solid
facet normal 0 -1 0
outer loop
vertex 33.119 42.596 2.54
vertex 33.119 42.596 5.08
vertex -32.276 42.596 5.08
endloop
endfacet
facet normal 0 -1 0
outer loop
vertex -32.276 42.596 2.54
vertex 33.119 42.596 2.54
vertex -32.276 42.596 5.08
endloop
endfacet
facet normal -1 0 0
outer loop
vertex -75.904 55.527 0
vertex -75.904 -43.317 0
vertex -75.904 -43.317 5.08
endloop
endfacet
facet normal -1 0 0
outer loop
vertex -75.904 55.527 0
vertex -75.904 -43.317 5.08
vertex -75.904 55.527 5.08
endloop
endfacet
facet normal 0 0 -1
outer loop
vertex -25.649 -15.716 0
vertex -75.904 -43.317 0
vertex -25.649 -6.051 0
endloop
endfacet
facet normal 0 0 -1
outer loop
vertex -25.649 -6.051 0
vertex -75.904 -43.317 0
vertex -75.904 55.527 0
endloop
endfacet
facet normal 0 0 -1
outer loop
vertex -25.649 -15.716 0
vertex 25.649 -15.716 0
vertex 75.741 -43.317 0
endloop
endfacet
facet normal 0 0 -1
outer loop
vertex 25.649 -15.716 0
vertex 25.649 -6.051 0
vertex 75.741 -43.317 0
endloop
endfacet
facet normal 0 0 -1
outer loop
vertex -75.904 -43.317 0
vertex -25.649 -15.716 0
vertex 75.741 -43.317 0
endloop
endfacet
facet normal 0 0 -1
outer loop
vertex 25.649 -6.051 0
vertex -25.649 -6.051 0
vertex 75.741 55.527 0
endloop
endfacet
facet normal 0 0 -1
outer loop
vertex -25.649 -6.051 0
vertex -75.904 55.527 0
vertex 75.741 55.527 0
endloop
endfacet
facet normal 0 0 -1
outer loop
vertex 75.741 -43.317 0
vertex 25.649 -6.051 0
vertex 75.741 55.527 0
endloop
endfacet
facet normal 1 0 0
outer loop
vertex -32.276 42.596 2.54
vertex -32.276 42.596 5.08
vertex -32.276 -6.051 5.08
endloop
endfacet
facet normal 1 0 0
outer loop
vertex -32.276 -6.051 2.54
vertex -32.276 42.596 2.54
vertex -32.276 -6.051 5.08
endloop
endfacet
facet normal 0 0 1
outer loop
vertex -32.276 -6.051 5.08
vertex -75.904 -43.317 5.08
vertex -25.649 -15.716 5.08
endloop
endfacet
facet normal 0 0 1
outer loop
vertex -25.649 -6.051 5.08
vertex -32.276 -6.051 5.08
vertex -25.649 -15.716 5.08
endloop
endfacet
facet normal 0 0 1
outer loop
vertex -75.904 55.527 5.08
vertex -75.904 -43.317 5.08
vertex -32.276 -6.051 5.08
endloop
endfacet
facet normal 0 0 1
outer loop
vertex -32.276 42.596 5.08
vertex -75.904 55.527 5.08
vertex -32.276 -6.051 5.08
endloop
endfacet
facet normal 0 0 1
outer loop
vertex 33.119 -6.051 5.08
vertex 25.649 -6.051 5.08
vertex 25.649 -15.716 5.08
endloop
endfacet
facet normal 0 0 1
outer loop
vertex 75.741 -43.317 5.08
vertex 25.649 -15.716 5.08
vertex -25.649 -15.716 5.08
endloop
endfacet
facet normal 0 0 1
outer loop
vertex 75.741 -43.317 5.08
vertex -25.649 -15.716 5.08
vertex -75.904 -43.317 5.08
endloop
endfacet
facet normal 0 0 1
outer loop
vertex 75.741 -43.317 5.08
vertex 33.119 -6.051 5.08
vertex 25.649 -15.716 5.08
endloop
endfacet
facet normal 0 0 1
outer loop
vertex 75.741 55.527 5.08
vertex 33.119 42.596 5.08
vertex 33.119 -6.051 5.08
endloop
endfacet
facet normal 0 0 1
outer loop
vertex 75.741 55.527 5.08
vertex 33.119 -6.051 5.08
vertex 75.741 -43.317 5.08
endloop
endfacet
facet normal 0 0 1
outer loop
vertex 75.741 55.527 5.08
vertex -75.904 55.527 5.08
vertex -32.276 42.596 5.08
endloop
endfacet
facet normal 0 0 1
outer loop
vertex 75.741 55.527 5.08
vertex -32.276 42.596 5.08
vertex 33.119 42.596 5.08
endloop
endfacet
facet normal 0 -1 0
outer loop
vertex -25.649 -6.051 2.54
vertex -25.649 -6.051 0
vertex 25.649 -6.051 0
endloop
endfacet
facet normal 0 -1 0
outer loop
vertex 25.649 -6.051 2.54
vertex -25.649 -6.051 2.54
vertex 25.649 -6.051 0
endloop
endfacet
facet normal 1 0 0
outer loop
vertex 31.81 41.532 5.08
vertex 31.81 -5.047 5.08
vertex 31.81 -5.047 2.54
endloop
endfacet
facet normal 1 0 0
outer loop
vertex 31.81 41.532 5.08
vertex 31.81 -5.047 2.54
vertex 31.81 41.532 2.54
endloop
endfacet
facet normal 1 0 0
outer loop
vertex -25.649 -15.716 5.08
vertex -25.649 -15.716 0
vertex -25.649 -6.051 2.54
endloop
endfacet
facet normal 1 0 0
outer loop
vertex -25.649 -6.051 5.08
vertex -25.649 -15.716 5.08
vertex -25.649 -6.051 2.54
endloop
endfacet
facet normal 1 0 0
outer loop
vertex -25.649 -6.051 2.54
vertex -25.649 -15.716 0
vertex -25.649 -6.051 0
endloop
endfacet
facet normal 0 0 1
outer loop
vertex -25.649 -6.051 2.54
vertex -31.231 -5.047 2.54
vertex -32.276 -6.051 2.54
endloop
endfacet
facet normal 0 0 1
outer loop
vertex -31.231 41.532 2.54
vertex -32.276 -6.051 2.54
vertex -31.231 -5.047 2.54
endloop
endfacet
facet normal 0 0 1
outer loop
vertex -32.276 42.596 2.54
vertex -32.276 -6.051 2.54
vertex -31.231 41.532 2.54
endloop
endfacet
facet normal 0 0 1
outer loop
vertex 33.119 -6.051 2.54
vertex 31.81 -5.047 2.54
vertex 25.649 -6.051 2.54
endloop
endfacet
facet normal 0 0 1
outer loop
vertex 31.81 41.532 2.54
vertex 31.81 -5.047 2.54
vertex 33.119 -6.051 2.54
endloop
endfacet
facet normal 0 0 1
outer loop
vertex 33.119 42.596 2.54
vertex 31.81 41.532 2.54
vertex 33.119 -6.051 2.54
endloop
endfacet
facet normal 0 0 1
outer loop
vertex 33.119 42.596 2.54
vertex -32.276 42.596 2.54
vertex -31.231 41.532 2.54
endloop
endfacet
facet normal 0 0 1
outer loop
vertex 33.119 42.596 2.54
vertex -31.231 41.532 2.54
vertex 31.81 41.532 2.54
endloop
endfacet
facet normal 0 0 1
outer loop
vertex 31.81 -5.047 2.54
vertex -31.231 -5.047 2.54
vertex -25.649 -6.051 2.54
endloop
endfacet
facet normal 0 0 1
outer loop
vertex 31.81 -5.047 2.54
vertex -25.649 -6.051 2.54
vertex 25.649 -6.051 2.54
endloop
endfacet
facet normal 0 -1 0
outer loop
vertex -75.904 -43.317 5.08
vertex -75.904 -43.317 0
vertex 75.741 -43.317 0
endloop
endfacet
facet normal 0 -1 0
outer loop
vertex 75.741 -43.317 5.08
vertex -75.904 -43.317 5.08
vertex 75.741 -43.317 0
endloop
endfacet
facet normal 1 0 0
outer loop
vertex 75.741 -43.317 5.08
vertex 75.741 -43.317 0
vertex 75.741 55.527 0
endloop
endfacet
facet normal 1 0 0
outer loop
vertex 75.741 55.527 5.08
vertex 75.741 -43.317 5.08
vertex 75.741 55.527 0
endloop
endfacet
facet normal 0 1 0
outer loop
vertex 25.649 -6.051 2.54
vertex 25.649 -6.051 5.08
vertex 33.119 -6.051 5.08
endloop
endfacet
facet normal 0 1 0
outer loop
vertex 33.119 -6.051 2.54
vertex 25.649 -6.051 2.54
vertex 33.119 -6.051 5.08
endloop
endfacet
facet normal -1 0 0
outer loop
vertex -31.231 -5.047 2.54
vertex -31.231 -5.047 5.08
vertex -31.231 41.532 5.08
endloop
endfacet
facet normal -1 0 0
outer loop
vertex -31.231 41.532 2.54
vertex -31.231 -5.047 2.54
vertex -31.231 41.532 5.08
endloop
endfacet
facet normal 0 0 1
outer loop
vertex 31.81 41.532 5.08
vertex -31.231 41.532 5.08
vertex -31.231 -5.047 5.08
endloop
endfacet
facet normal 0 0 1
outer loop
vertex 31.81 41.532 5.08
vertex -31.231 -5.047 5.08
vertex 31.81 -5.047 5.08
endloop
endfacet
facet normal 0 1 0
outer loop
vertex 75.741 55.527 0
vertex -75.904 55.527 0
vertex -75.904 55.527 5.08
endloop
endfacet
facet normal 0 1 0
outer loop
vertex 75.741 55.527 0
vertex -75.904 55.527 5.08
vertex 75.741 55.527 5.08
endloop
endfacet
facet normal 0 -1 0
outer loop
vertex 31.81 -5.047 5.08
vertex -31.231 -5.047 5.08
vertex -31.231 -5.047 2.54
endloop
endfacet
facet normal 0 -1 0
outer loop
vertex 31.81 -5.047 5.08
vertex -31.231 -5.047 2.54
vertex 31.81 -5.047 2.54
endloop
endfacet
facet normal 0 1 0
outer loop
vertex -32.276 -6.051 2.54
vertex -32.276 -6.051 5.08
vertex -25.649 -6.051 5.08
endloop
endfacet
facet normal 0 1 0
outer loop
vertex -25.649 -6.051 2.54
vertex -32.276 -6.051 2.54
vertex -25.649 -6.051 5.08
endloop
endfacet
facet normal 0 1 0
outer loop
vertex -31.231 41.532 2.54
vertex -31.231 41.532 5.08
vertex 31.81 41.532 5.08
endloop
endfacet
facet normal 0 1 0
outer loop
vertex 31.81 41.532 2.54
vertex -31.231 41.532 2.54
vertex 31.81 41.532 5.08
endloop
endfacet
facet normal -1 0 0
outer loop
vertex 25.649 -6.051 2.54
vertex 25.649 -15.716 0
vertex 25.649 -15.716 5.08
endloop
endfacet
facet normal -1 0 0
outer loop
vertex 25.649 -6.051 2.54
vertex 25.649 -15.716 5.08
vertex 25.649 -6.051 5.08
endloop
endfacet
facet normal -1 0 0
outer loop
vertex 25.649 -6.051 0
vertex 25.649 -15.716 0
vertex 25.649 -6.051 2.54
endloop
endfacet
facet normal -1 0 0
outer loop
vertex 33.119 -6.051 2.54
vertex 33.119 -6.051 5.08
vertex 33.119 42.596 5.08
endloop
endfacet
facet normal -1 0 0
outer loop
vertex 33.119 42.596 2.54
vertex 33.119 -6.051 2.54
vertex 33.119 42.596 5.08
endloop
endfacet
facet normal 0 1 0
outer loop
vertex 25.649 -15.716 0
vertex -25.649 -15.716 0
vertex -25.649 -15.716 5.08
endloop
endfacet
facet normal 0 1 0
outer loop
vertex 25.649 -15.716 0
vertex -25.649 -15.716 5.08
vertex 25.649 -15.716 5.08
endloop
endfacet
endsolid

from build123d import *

# Parameters (mm, degrees)
F0_W     = 151.6449451447
F0_H     = 98.8437831402
F1_DEPTH = 5.08
F2_W     = 51.2981526554
F2_H     = 9.6649971419
F3_DEPTH = 25.146
F4_W     = 63.0413852632
F4_H     = 46.5789679438
F5_DEPTH = 2.54


with BuildPart() as f1:
    # F0 (on Top) → F1 (new body)
    with BuildSketch(Plane.XY):
        with Locations((-0.081807375, 6.1048939824)):
            Rectangle(F0_W, F0_H)
    extrude(amount=F1_DEPTH)

    # F2 (on Top) → F3 (cut)
    with BuildSketch(Plane.XY):
        with Locations((0, -10.8838873326)):
            Rectangle(F2_W, F2_H)
    extrude(amount=F3_DEPTH, mode=Mode.SUBTRACT)

    # F4 (on face) → F5 (cut)
    with BuildSketch(Plane.XY.offset(5.08)):
        Polygon((-32.2755798697, 42.5956249237), (-32.2755798697, -6.0513887617), (-25.6490763277, -6.0513887617), (25.6490763277, -6.0513887617), (33.1190824509, -6.0513887617), (33.1190824509, 42.5956249237), align=None)
        with Locations((0.2893041819, 18.2428015396)):
            Rectangle(F4_W, F4_H, mode=Mode.SUBTRACT)
    extrude(amount=-F5_DEPTH, mode=Mode.SUBTRACT)


solid = f1.part
